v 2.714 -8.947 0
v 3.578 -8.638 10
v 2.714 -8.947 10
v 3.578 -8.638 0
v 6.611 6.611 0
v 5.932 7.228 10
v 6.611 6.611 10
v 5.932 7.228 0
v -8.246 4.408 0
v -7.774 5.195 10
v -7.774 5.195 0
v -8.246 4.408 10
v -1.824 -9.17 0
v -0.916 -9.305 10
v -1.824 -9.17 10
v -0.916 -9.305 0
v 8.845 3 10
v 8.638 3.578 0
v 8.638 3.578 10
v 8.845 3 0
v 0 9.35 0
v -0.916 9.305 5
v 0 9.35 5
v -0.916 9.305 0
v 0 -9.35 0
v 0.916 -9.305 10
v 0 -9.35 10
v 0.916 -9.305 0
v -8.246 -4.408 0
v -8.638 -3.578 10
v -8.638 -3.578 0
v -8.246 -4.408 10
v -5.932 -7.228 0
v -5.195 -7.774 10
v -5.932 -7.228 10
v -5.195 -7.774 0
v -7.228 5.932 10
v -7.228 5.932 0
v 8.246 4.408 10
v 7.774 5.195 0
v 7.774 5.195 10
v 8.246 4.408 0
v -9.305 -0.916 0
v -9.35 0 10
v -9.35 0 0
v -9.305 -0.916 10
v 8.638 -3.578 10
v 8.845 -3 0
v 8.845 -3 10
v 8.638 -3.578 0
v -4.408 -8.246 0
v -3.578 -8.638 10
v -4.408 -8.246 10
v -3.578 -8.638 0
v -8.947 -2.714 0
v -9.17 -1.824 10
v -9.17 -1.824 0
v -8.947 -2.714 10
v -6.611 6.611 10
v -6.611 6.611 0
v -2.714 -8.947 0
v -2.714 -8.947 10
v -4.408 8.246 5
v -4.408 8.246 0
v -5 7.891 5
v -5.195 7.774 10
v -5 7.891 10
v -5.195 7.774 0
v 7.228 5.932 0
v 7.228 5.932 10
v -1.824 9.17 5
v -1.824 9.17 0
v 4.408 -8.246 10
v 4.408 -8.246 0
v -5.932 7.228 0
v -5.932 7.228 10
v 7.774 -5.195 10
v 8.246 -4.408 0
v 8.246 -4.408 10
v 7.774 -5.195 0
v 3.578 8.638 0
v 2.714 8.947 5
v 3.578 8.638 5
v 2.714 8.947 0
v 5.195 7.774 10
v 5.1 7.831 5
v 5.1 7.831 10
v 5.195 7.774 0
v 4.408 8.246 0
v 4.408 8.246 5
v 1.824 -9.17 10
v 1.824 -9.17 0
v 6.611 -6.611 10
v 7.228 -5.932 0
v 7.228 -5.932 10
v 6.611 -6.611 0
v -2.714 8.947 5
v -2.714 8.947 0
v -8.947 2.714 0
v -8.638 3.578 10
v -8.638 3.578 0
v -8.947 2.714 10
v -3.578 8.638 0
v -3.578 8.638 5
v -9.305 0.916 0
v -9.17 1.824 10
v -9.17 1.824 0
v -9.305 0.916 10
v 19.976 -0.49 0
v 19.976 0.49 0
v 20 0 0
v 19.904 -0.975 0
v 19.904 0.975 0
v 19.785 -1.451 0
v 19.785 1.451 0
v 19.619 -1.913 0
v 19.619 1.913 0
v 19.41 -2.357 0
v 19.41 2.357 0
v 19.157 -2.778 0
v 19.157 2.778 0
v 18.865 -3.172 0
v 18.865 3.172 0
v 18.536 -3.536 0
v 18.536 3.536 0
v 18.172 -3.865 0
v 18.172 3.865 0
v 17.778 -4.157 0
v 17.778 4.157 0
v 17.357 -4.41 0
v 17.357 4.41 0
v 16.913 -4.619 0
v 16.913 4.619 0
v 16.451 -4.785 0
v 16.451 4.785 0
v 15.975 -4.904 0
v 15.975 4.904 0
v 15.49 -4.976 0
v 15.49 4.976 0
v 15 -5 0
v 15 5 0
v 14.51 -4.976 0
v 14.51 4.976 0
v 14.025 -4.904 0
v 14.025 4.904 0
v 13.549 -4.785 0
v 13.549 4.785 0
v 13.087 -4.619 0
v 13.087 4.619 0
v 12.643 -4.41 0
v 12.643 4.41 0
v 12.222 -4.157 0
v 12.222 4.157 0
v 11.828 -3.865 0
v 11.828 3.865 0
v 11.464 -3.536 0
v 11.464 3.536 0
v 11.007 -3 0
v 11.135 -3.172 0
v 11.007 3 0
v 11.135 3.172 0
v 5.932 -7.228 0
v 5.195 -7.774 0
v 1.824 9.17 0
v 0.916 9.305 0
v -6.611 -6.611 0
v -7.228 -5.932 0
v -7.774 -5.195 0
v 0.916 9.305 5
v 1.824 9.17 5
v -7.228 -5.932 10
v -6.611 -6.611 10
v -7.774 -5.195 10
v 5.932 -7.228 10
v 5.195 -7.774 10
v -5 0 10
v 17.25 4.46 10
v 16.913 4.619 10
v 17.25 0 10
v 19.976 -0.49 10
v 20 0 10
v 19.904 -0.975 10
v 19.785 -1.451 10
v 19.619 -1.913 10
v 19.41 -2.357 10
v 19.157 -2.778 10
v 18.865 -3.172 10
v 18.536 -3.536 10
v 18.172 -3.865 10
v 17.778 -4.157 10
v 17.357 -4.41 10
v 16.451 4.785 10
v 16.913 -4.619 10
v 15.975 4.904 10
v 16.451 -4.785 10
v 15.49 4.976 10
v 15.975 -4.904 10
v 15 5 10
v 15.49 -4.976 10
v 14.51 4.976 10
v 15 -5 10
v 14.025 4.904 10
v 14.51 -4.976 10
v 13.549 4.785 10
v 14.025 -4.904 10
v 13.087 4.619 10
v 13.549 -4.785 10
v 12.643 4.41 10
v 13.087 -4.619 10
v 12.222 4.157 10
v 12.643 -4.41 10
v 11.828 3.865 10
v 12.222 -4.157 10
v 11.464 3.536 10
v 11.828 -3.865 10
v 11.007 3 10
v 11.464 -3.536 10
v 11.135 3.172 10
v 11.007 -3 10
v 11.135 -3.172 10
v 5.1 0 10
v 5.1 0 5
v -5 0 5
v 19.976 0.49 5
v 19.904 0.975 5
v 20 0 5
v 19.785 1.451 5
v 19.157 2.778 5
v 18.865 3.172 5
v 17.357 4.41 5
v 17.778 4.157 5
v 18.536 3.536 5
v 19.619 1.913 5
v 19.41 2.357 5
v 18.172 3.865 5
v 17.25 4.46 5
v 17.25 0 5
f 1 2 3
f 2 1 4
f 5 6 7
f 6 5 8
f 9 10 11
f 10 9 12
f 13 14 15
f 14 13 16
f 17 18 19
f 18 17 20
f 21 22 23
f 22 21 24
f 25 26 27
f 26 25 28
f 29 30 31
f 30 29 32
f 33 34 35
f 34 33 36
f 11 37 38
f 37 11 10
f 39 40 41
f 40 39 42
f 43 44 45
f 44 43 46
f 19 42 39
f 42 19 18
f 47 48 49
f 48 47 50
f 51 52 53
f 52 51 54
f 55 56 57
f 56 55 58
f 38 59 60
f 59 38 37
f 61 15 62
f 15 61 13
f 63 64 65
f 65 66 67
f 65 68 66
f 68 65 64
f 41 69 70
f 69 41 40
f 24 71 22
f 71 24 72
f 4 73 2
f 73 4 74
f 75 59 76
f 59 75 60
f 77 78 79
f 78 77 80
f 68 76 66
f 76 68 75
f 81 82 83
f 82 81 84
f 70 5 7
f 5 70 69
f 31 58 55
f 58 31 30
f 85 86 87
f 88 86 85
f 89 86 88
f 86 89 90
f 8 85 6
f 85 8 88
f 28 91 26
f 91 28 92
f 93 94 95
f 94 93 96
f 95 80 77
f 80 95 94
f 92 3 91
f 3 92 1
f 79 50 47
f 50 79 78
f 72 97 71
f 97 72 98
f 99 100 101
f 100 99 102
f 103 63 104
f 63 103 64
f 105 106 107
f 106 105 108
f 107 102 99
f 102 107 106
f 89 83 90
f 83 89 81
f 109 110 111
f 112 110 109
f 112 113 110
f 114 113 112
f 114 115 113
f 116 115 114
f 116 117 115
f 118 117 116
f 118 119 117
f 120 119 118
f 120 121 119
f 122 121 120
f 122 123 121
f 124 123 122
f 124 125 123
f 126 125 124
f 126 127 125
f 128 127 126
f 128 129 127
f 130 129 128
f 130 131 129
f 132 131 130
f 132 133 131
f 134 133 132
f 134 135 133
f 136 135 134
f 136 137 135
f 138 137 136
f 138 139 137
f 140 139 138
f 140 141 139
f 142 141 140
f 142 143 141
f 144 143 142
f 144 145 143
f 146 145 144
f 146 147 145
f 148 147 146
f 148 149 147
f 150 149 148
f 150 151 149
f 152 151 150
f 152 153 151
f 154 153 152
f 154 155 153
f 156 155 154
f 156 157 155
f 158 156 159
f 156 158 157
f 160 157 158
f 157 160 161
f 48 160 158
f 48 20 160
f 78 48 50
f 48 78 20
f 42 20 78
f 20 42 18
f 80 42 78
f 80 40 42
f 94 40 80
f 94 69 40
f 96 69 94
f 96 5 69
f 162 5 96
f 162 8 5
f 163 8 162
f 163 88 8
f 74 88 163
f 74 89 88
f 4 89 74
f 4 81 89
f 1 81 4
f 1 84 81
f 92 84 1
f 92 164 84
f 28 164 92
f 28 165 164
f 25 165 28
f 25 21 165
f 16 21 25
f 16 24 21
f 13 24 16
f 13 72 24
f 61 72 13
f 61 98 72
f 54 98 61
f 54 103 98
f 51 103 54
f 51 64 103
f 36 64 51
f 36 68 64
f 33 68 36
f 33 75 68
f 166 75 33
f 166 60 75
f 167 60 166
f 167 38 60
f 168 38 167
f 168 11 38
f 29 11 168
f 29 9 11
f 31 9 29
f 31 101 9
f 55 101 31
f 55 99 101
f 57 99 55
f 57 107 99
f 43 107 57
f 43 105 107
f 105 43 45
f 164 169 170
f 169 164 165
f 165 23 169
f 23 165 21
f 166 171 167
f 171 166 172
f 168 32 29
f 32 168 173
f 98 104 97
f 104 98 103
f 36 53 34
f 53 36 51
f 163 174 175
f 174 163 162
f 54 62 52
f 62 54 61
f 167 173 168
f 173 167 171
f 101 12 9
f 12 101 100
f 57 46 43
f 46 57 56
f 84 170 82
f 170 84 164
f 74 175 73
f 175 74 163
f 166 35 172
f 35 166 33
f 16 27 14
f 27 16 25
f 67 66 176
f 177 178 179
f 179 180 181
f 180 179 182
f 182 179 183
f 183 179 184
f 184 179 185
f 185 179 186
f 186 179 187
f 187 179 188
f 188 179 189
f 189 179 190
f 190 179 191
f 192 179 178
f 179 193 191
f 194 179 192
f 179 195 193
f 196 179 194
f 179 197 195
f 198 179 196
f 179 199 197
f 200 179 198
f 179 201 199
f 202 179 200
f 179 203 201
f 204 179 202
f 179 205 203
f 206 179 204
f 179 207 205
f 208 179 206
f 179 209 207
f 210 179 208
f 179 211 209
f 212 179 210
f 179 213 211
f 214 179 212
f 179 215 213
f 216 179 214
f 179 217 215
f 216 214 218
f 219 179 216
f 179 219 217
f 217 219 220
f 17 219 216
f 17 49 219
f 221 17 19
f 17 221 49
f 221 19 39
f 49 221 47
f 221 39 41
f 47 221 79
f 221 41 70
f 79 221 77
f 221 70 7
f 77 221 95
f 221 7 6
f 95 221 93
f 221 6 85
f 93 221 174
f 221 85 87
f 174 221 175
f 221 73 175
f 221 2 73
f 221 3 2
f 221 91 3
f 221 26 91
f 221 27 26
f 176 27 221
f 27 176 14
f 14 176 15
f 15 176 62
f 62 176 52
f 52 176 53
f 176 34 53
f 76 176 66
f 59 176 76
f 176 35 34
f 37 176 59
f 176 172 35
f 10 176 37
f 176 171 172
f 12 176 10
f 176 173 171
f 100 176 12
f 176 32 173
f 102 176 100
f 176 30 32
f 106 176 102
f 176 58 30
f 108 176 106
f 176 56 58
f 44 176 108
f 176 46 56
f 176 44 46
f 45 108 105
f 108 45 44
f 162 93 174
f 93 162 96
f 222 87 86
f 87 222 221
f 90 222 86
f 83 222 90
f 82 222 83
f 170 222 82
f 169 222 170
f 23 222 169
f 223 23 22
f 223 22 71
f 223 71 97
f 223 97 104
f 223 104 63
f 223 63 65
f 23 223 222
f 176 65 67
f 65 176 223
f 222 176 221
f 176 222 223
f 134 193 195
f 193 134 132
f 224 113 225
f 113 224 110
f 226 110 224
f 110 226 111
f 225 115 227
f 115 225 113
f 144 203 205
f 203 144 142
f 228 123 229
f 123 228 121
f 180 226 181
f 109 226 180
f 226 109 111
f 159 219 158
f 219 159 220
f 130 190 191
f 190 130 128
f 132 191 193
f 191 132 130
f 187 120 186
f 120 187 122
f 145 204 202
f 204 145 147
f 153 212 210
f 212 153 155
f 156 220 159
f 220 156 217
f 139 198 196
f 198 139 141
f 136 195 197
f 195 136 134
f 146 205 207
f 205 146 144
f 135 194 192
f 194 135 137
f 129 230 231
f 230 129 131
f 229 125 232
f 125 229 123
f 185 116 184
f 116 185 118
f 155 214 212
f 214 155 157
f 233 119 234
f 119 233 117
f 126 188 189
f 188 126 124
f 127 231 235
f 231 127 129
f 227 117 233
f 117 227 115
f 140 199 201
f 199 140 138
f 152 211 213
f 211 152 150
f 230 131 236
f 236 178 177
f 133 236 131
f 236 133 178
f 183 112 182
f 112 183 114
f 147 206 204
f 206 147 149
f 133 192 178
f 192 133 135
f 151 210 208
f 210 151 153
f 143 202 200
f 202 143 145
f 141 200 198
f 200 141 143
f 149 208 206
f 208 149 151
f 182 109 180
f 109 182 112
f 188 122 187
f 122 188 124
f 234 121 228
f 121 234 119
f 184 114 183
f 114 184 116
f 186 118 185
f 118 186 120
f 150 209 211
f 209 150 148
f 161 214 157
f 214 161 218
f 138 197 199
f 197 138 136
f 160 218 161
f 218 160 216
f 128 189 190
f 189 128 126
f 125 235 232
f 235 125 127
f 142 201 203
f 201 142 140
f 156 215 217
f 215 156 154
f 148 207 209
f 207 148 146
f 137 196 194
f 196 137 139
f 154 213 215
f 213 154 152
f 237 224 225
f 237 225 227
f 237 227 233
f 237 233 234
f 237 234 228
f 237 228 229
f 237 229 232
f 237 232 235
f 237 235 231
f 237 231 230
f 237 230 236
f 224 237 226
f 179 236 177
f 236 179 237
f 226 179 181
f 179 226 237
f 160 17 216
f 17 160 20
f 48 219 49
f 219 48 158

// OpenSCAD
// Snap-on Clip for Lab Stand Rod and Tubing
// Orientation: Flat on XY plane, building up in +Z.
// Units: Millimetres.

// --- Dimensions ---
// Rod Stand Dimensions
$rod_diameter = 12.7;
$rod_wall_thickness = 3;
$rod_outer_diameter = $rod_diameter + 2 * $rod_wall_thickness; // 18.7
$rod_center = [0, 0];

// Tubing Dimensions
$tubing_diameter = 6;
$tubing_wall_thickness = 2;
$tubing_outer_diameter = $tubing_diameter + 2 * $tubing_wall_thickness; // 10
$tubing_center = [15, 0];

// Clip Geometry
$clip_height = 10;
$bridge_width_x = 4; // Distance between x=8 and x=12
$bridge_width_y = 6;
$opening_width_rod = 10;
$opening_width_tubing = 4.5;

// Extrusion settings
$fn = 64;

module rod_ring() {
    // Rod ring: 12.7mm ID, 3mm wall, centred at origin.
    // Opening cut: x < 0 and -5 < y < 5.
    
    difference() {
        // Extrude the full ring
        translate($rod_center)
        cylinder(h = $clip_height, d = $rod_outer_diameter, $fn = $fn);
        
        // Cut the opening on the -X side
        // Opening is 10mm wide, centred at y=0, so y goes from -5 to 5.
        // We cut a rectangle that extends slightly past the ring face to ensure clean cut.
        translate([-($opening_width_rod/2), 0, $clip_height/2])
        cube([
            $opening_width_rod + 0.1, // Extend past face
            $opening_width_rod,       // Height in Y (-5 to 5)
            $clip_height + 0.1         // Extend past top/bottom
        ]);
    }
}

module tubing_ring() {
    // Tubing ring: 6mm ID, 2mm wall, centred at x=15, y=0.
    // Opening cut: x > 15 and -2.25 < y < 2.25.
    
    difference() {
        // Extrude the full ring
        translate($tubing_center)
        cylinder(h = $clip_height, d = $tubing_outer_diameter, $fn = $fn);
        
        // Cut the opening on the +X side
        // Opening is 4.5mm wide, centred at y=0, so y goes from -2.25 to 2.25.
        translate([$tubing_center[0] + ($opening_width_tubing/2), 0, $clip_height/2])
        cube([
            $opening_width_tubing + 0.1, // Extend past face
            $opening_width_tubing,       // Height in Y
            $clip_height + 0.1           // Extend past top/bottom
        ]);
    }
}

module bridge() {
    // Solid bridge 6mm wide (Y) between x = 8 and x = 12.
    // Joins the two rings without blocking holes.
    
    translate([8, -($bridge_width_y/2), 0])
    cube([
        $bridge_width_x, // Width in X (12 - 8 = 4)
        $bridge_width_y, // Width in Y (6)
        $clip_height     // Height in Z
    ]);
}

// --- Main Assembly ---
difference() {
    union() {
        rod_ring();
        tubing_ring();
        bridge();
    }
}
